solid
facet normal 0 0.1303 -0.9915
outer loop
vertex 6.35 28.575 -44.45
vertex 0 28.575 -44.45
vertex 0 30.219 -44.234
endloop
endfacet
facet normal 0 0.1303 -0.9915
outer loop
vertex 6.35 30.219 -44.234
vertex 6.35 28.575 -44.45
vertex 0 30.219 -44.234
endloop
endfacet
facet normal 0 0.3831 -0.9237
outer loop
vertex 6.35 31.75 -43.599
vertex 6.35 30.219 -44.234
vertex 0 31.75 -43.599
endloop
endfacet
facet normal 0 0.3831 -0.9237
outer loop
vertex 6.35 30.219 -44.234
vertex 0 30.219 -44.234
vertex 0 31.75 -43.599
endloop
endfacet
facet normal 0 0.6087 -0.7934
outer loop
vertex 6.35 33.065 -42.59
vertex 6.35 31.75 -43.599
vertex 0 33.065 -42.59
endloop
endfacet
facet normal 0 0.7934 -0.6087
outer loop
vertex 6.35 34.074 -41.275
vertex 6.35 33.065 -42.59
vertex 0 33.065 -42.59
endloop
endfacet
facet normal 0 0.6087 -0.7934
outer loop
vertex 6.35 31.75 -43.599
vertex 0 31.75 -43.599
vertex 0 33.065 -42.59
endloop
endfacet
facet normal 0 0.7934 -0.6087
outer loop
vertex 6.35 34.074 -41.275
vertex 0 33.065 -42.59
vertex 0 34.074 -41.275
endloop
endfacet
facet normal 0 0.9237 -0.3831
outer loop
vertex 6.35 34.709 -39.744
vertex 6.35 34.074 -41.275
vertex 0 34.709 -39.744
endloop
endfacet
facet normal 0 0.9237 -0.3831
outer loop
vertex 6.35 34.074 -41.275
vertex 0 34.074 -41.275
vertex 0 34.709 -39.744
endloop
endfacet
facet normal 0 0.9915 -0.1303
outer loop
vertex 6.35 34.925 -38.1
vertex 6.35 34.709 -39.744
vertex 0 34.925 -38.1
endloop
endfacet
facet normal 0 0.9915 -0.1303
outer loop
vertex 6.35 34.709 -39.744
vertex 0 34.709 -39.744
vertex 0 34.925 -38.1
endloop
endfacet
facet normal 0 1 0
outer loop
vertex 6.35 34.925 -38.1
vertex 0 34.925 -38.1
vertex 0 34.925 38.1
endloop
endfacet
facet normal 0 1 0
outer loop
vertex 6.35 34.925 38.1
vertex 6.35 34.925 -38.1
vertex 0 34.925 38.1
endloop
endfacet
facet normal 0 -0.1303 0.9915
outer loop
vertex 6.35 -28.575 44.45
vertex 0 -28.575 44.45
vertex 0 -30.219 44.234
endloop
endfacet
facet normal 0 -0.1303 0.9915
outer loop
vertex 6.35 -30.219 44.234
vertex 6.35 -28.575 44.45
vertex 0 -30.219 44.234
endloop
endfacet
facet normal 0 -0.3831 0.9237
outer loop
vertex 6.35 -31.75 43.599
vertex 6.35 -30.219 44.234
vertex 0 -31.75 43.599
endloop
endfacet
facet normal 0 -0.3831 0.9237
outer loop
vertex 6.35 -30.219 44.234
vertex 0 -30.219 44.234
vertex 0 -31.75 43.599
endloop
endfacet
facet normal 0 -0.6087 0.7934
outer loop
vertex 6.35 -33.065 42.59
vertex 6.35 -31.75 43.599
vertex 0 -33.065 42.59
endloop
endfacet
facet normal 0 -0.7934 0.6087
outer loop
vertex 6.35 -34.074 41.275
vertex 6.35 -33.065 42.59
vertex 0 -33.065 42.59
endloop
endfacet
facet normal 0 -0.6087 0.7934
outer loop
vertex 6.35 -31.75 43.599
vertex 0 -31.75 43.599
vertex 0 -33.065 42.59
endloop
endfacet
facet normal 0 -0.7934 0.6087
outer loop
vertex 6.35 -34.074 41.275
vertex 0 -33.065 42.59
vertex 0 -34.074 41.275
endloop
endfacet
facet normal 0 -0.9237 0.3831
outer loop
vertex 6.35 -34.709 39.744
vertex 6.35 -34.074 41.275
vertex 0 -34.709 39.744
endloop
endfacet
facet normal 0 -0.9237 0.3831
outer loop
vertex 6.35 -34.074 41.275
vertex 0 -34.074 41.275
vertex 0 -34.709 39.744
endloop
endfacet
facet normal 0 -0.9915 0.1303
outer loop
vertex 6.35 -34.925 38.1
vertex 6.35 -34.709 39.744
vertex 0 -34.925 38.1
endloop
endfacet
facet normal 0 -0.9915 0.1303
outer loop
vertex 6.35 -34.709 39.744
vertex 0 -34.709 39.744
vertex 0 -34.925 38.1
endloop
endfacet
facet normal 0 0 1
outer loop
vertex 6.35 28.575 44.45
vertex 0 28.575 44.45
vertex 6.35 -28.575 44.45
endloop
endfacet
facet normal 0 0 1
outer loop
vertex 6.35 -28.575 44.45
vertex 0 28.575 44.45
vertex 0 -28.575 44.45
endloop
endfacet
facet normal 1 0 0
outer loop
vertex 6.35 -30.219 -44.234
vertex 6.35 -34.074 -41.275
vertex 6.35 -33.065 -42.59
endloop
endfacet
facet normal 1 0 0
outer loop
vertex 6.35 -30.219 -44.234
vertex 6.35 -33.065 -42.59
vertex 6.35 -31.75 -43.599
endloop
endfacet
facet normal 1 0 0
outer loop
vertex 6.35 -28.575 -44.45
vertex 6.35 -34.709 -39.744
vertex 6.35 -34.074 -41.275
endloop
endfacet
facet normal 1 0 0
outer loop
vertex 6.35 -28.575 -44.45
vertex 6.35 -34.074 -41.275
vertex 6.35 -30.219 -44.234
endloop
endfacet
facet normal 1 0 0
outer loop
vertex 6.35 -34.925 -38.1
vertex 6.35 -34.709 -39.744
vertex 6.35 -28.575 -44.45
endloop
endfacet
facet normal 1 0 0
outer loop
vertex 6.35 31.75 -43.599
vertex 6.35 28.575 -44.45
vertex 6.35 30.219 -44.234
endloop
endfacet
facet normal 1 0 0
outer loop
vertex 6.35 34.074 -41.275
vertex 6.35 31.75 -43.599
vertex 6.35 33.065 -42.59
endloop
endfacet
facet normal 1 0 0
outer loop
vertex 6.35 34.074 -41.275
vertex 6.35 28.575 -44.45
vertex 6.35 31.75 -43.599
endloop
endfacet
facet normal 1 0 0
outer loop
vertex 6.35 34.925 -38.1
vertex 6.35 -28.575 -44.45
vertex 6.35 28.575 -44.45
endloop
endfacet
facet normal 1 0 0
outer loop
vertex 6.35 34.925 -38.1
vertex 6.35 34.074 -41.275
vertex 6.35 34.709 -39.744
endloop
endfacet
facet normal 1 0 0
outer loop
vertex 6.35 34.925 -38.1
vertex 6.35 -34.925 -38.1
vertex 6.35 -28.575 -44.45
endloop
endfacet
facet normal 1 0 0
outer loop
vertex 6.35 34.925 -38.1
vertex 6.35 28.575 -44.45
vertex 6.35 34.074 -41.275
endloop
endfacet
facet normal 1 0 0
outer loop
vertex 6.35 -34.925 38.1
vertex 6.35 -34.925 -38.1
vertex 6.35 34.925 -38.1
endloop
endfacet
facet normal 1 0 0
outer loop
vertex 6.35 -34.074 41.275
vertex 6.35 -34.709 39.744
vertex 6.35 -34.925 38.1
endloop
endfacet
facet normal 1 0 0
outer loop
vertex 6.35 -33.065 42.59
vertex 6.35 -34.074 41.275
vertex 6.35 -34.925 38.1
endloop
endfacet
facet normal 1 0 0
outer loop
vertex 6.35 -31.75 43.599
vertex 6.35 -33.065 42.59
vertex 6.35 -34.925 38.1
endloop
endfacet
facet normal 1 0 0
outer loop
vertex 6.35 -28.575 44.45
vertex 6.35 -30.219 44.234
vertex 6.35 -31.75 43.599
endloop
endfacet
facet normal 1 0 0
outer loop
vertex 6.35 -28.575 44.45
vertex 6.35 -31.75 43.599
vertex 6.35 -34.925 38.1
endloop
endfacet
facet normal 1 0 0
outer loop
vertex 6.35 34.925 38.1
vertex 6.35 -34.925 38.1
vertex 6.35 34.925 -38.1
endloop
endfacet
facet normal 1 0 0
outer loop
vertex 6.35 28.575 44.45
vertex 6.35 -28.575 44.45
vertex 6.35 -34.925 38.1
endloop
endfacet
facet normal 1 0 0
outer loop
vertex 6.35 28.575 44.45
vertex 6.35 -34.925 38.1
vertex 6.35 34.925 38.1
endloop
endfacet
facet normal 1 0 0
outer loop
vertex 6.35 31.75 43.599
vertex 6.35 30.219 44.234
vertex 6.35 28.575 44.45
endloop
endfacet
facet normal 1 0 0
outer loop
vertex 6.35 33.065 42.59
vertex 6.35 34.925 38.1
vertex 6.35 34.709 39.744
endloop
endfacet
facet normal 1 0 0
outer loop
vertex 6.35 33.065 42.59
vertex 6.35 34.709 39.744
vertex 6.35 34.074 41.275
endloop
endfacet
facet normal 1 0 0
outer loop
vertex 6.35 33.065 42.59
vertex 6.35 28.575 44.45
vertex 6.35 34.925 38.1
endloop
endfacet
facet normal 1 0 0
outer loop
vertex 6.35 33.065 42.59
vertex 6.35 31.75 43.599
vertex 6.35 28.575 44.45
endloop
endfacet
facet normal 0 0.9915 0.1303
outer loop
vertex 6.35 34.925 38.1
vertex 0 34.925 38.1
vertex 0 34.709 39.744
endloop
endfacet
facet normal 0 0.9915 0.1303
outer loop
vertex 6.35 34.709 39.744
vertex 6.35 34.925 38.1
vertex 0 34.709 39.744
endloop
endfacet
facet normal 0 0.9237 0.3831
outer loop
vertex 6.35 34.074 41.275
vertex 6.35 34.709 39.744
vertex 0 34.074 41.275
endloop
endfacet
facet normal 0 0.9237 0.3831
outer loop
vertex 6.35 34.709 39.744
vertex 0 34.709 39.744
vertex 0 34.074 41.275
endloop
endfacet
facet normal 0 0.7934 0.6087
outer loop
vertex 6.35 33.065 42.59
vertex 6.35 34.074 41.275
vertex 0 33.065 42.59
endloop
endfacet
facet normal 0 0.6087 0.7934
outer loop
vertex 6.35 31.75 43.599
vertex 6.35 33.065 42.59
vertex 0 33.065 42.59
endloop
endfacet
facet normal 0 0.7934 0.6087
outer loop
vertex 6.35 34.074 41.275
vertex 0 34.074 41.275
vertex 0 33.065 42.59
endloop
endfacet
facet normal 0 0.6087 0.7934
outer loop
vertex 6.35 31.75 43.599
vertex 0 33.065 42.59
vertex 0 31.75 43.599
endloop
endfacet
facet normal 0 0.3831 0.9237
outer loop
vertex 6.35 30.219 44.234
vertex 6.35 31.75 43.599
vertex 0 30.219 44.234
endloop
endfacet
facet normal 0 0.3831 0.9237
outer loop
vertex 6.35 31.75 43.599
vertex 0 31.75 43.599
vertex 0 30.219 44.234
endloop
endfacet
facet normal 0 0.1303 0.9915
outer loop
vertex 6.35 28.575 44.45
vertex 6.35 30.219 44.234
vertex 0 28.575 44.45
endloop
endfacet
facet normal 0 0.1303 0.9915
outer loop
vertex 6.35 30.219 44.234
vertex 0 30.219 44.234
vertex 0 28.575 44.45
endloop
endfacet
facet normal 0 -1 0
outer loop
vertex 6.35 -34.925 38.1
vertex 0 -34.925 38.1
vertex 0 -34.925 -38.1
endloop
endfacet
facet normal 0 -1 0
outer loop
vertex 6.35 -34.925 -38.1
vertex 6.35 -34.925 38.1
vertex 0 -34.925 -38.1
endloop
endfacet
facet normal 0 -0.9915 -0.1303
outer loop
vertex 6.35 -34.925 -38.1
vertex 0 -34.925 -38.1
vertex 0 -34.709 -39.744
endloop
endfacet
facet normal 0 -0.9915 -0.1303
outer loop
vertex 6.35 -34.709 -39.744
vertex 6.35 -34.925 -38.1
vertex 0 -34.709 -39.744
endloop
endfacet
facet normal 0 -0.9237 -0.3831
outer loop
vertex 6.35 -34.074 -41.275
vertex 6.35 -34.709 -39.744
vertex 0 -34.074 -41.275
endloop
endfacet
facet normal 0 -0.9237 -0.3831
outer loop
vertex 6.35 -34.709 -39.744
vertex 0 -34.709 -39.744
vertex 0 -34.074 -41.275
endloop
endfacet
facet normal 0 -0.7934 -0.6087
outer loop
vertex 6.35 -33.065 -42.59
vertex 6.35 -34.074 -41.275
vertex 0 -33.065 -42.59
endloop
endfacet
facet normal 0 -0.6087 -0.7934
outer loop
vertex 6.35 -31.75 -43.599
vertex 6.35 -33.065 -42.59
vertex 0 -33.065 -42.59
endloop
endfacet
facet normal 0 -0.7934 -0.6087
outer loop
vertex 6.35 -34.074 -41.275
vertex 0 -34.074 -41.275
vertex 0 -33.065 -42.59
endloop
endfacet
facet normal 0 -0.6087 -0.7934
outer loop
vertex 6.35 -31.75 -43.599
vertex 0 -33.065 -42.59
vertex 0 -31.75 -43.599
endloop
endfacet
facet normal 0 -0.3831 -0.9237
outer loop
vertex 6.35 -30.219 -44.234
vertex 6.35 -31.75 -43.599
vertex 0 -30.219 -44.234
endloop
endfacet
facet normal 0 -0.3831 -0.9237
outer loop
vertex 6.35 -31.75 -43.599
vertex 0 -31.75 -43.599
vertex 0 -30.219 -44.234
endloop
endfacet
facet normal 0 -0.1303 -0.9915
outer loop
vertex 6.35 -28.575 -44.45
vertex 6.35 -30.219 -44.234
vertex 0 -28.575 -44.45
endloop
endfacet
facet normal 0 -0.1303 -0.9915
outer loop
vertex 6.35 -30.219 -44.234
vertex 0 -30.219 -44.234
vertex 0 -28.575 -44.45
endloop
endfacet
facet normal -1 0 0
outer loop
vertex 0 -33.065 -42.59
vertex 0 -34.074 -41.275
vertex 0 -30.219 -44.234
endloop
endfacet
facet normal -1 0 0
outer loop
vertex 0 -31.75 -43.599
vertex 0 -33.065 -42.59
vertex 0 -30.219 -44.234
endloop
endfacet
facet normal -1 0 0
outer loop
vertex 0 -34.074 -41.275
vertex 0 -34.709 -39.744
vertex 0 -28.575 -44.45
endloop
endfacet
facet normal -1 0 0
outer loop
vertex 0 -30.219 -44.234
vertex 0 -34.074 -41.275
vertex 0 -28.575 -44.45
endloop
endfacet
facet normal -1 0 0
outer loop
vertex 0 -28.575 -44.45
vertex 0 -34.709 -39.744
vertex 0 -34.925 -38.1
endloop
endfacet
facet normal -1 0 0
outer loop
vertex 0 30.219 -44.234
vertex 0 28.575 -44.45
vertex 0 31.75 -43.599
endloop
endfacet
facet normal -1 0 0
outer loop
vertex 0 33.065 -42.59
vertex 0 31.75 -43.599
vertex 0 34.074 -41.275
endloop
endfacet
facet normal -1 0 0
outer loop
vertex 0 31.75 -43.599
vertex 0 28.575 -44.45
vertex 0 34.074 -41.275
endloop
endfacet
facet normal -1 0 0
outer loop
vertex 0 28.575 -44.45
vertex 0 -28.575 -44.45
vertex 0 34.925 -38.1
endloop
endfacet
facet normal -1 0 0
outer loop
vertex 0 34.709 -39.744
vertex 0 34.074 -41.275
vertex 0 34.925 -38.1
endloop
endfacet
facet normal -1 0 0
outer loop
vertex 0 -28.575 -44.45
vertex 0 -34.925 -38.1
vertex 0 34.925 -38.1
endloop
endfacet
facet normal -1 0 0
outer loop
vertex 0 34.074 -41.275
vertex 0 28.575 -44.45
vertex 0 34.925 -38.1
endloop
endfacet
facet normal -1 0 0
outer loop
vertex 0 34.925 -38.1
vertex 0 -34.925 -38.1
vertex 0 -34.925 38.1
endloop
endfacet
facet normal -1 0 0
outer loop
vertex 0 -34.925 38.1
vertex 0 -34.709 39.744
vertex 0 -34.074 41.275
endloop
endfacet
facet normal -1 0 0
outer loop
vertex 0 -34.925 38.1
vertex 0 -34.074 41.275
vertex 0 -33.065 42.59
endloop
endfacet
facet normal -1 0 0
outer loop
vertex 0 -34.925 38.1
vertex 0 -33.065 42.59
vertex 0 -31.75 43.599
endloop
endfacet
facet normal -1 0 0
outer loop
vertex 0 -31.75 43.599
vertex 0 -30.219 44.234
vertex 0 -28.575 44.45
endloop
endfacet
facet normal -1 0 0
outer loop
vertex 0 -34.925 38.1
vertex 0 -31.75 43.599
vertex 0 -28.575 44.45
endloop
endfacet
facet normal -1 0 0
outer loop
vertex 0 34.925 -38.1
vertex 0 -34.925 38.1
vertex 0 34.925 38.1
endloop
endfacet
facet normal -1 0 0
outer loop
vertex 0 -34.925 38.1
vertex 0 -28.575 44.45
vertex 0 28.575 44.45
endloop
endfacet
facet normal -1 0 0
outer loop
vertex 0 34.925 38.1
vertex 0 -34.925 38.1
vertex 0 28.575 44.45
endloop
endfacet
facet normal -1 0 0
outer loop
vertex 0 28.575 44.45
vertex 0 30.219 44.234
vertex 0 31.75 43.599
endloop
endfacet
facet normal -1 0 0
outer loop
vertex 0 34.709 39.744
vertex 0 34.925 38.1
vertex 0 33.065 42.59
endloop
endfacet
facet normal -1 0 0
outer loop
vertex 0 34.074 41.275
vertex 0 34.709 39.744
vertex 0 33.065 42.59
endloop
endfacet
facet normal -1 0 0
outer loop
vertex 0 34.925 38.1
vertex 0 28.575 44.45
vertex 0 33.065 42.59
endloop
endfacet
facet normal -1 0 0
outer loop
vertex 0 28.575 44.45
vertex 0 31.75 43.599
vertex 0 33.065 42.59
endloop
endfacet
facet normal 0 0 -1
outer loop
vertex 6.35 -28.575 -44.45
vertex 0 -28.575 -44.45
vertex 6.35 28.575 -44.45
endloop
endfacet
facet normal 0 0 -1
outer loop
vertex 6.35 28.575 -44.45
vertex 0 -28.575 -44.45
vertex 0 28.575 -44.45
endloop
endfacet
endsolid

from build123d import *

# Parameters (mm, degrees)
F1_DEPTH = 6.35
F4_DEPTH = 6.35


with BuildPart() as f1:
    # F0 (on Right) → F1 (new body)
    with BuildSketch(Plane.YZ):
        with BuildLine():
            ThreePointArc((41.275, 38.1), (38.4851920908, 44.8351920908), (31.75, 47.625))
            Line((31.75, 47.625), (-31.75, 47.625))
            ThreePointArc((-31.75, 47.625), (-38.4851920908, 44.8351920908), (-41.275, 38.1))
            Line((-41.275, 38.1), (-41.275, -38.1))
            ThreePointArc((-41.275, -38.1), (-38.4851920908, -44.8351920908), (-31.75, -47.625))
            Line((-31.75, -47.625), (31.75, -47.625))
            ThreePointArc((31.75, -47.625), (38.4851920908, -44.8351920908), (41.275, -38.1))
            Line((41.275, -38.1), (41.275, 38.1))
        make_face()
    extrude(amount=F1_DEPTH)


with BuildPart() as f4:
    # F3 (on Right) → F4 (new body)
    with BuildSketch(Plane.YZ):
        with BuildLine():
            ThreePointArc((34.925, 38.1), (33.0651280605, 42.5901280605), (28.575, 44.45))
            Line((28.575, 44.45), (-28.575, 44.45))
            ThreePointArc((-28.575, 44.45), (-33.0651280605, 42.5901280605), (-34.925, 38.1))
            Line((-34.925, 38.1), (-34.925, -38.1))
            ThreePointArc((-34.925, -38.1), (-33.0651280605, -42.5901280605), (-28.575, -44.45))
            Line((-28.575, -44.45), (28.575, -44.45))
            ThreePointArc((28.575, -44.45), (33.0651280605, -42.5901280605), (34.925, -38.1))
            Line((34.925, -38.1), (34.925, 38.1))
        make_face()
    extrude(amount=F4_DEPTH)


solid = f4.part
